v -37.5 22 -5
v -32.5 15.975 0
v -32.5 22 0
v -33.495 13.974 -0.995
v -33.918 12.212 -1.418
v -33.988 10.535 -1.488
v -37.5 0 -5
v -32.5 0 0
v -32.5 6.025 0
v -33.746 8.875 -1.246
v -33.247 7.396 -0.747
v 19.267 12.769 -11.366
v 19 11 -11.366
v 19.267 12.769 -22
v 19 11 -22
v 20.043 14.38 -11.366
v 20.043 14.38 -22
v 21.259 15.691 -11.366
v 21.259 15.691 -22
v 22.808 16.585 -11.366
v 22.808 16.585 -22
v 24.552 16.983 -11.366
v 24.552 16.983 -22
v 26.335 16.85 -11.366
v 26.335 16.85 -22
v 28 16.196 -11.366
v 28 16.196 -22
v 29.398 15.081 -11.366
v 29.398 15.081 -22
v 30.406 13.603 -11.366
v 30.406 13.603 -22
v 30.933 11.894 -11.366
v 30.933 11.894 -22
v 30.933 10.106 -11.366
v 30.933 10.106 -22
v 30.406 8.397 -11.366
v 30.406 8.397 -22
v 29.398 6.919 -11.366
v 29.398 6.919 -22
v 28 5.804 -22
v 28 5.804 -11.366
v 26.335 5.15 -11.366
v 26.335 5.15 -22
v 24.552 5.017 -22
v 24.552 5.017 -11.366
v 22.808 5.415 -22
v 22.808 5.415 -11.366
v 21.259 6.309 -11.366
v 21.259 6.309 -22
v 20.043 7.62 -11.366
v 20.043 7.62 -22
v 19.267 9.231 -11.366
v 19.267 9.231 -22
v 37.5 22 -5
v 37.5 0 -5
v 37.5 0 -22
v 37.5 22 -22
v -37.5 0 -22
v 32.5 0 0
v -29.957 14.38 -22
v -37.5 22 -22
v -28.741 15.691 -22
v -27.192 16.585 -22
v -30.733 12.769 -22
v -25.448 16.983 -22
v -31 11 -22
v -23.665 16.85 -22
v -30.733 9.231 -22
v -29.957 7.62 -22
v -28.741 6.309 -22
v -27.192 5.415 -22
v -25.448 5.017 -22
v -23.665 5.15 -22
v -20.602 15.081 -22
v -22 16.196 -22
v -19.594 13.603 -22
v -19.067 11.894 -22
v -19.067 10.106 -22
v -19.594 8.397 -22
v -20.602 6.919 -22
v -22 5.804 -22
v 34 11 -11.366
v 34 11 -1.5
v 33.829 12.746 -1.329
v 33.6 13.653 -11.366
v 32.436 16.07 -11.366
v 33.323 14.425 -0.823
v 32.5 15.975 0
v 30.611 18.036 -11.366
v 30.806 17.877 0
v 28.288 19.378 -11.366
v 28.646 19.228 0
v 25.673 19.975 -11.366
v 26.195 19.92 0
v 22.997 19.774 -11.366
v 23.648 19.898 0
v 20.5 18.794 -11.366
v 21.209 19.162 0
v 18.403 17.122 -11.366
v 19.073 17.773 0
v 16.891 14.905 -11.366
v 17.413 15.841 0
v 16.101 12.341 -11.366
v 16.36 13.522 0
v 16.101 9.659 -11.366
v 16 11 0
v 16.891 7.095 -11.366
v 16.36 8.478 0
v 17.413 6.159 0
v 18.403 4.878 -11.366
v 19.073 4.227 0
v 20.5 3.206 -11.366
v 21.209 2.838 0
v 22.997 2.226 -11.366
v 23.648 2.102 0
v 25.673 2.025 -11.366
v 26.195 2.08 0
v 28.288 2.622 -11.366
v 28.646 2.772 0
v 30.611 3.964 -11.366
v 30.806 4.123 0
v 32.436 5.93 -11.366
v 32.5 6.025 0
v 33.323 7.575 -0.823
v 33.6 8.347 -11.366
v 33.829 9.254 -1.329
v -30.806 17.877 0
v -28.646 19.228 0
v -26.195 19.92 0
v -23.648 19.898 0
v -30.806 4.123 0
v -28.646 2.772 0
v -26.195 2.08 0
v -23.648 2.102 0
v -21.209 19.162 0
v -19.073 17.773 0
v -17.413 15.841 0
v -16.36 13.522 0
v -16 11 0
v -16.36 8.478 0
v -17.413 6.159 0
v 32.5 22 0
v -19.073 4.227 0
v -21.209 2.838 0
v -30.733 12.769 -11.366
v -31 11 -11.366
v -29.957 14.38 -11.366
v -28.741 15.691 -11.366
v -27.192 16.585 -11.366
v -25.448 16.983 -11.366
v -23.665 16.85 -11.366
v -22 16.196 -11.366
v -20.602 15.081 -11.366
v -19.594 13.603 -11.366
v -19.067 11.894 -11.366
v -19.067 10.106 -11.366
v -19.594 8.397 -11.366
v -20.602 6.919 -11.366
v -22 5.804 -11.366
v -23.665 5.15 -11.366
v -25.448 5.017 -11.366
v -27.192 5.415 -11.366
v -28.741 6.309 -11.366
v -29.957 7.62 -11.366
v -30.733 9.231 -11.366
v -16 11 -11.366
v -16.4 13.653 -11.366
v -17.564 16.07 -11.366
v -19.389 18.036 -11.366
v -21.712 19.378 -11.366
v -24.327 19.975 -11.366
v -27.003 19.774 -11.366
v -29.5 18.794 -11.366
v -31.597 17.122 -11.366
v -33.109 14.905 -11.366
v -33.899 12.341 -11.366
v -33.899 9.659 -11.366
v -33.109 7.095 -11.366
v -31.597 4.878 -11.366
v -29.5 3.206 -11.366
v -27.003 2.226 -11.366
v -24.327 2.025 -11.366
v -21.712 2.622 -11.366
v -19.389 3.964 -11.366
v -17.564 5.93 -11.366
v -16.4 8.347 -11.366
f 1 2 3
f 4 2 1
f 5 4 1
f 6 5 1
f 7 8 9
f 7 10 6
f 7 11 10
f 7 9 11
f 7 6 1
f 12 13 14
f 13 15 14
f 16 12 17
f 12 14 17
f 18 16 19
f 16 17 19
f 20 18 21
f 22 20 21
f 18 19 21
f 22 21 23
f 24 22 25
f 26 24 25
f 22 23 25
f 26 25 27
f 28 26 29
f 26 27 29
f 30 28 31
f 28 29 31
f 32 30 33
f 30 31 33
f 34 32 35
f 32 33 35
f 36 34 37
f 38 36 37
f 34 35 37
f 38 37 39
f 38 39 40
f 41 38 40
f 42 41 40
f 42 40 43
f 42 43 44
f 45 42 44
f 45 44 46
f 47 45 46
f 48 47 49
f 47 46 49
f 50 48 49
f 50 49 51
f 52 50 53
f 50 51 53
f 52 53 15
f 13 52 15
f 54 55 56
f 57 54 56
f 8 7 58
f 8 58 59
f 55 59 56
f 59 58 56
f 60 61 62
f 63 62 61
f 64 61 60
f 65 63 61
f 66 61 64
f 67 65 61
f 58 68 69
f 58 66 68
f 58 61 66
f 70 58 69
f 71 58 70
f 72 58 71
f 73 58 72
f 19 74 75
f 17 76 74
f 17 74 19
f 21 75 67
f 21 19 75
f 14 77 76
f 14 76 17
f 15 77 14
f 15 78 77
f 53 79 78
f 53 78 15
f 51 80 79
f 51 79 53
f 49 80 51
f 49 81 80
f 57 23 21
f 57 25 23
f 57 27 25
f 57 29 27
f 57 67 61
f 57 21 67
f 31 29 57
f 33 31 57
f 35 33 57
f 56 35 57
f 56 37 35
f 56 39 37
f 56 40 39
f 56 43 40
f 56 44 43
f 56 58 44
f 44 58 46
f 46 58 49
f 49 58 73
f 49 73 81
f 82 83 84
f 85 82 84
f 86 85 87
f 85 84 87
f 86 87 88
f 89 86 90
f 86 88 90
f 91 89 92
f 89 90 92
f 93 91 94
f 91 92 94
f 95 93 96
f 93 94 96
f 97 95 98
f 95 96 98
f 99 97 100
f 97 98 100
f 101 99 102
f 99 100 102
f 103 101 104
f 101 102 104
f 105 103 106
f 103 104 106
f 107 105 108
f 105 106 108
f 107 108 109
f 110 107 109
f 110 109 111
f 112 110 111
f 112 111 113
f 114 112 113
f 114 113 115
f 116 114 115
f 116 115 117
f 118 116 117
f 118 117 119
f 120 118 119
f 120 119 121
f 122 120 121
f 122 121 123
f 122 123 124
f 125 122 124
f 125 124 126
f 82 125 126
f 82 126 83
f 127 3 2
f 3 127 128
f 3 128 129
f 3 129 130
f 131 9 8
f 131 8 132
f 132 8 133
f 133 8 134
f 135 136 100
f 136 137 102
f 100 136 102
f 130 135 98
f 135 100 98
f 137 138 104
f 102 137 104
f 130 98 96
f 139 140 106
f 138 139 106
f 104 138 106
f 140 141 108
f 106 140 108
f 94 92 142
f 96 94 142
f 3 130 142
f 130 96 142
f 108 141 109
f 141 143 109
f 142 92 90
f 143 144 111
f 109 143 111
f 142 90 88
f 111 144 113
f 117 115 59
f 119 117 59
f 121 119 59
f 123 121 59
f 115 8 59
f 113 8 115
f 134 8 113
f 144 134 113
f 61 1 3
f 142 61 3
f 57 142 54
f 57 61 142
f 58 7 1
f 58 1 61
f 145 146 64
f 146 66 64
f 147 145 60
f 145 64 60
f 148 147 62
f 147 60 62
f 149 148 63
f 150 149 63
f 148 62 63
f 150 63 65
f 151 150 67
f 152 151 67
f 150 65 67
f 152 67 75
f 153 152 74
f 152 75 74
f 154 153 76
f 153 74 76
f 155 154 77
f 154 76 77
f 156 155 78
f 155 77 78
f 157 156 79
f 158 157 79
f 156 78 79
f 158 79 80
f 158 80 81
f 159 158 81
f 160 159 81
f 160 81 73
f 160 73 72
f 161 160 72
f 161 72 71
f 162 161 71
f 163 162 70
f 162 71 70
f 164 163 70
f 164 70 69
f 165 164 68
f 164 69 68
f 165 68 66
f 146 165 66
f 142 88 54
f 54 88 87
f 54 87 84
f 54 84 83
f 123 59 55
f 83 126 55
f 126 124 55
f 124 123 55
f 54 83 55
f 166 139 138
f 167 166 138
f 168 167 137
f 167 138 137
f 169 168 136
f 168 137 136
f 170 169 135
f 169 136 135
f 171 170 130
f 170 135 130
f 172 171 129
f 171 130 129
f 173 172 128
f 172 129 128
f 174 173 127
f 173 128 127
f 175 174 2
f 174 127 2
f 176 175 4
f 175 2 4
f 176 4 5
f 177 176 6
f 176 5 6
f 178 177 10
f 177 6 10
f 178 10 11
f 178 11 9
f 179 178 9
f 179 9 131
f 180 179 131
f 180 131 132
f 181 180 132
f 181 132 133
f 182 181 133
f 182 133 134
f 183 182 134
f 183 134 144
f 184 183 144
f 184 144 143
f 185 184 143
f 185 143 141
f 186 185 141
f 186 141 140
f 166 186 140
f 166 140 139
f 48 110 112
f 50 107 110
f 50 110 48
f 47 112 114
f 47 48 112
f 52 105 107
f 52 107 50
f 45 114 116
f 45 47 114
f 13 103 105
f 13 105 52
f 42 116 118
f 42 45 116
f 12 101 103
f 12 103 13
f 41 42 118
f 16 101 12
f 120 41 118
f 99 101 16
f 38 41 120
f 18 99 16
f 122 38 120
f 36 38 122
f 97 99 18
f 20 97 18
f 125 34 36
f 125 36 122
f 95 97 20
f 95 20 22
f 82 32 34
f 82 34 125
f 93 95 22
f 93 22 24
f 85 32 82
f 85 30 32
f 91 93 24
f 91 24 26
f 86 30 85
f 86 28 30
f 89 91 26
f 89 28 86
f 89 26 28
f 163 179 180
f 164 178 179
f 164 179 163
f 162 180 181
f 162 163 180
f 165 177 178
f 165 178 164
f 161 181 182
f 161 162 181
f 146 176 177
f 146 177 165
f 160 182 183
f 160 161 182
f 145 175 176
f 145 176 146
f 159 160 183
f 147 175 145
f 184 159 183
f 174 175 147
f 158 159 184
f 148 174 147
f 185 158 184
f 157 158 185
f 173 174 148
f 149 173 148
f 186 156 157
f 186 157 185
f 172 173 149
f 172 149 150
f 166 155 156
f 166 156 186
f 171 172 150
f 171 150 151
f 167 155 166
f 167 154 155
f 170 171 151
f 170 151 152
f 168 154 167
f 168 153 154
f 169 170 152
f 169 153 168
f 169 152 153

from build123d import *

# Parameters (mm, degrees)
SKETCH1_W                                        = 75
SKETCH1_H                                        = 22
BOSS_EXTRUDE1_DEPTH                              = 22
CBORE_FOR_M10_SOCKET_HEAD_CAP_SCREW1_D           = 12
CBORE_FOR_M10_SOCKET_HEAD_CAP_SCREW1_CBORE_D     = 18
CBORE_FOR_M10_SOCKET_HEAD_CAP_SCREW1_CBORE_DEPTH = 11.366
CHAMFER1_SIZE                                    = 5


with BuildPart() as part:
    # Sketch1 → Boss-Extrude1 (new body)
    with BuildSketch(Plane(origin=(0, 0, 0), x_dir=(1, 0, 0), z_dir=(0, 1, 0))):
        with Locations((0, 11)):
            Rectangle(SKETCH1_W, SKETCH1_H)
    extrude(amount=BOSS_EXTRUDE1_DEPTH)

    # CBORE for M10 Socket Head Cap Screw1 (through all)
    with Locations(Plane.XY):
        with Locations((25, 11), (-25, 11)):
            CounterBoreHole(CBORE_FOR_M10_SOCKET_HEAD_CAP_SCREW1_D / 2, CBORE_FOR_M10_SOCKET_HEAD_CAP_SCREW1_CBORE_D / 2, CBORE_FOR_M10_SOCKET_HEAD_CAP_SCREW1_CBORE_DEPTH)

    # Chamfer1
    # the kernel refuses this chamfer: 5 mm, written as the material it takes off along each edge
    with BuildSketch(Plane(origin=(37.5, -12.85841494, 0), x_dir=(-0.9996219169112968, 0, 0.027495876610586372), z_dir=(0, 1, 0))) as chamfer1_piece_1:
        Polygon((CHAMFER1_SIZE * 0.999621916911, -CHAMFER1_SIZE * 0.0274958766106), (-CHAMFER1_SIZE * 0.0274958766106, -CHAMFER1_SIZE * 0.999621916911), (0, 0), align=None)
    extrude(amount=47.71682988, mode=Mode.SUBTRACT)
    with BuildSketch(Plane(origin=(-37.5, -12.85841494, 0), x_dir=(0.9996219169112968, 0, 0.027495876610586372), z_dir=(0, 1, 0))) as chamfer1_piece_2:
        Polygon((CHAMFER1_SIZE * 0.999621916911, CHAMFER1_SIZE * 0.0274958766106), (-CHAMFER1_SIZE * 0.0274958766106, CHAMFER1_SIZE * 0.999621916911), (0, 0), align=None)
    extrude(amount=47.71682988, mode=Mode.SUBTRACT)


solid = part.part
